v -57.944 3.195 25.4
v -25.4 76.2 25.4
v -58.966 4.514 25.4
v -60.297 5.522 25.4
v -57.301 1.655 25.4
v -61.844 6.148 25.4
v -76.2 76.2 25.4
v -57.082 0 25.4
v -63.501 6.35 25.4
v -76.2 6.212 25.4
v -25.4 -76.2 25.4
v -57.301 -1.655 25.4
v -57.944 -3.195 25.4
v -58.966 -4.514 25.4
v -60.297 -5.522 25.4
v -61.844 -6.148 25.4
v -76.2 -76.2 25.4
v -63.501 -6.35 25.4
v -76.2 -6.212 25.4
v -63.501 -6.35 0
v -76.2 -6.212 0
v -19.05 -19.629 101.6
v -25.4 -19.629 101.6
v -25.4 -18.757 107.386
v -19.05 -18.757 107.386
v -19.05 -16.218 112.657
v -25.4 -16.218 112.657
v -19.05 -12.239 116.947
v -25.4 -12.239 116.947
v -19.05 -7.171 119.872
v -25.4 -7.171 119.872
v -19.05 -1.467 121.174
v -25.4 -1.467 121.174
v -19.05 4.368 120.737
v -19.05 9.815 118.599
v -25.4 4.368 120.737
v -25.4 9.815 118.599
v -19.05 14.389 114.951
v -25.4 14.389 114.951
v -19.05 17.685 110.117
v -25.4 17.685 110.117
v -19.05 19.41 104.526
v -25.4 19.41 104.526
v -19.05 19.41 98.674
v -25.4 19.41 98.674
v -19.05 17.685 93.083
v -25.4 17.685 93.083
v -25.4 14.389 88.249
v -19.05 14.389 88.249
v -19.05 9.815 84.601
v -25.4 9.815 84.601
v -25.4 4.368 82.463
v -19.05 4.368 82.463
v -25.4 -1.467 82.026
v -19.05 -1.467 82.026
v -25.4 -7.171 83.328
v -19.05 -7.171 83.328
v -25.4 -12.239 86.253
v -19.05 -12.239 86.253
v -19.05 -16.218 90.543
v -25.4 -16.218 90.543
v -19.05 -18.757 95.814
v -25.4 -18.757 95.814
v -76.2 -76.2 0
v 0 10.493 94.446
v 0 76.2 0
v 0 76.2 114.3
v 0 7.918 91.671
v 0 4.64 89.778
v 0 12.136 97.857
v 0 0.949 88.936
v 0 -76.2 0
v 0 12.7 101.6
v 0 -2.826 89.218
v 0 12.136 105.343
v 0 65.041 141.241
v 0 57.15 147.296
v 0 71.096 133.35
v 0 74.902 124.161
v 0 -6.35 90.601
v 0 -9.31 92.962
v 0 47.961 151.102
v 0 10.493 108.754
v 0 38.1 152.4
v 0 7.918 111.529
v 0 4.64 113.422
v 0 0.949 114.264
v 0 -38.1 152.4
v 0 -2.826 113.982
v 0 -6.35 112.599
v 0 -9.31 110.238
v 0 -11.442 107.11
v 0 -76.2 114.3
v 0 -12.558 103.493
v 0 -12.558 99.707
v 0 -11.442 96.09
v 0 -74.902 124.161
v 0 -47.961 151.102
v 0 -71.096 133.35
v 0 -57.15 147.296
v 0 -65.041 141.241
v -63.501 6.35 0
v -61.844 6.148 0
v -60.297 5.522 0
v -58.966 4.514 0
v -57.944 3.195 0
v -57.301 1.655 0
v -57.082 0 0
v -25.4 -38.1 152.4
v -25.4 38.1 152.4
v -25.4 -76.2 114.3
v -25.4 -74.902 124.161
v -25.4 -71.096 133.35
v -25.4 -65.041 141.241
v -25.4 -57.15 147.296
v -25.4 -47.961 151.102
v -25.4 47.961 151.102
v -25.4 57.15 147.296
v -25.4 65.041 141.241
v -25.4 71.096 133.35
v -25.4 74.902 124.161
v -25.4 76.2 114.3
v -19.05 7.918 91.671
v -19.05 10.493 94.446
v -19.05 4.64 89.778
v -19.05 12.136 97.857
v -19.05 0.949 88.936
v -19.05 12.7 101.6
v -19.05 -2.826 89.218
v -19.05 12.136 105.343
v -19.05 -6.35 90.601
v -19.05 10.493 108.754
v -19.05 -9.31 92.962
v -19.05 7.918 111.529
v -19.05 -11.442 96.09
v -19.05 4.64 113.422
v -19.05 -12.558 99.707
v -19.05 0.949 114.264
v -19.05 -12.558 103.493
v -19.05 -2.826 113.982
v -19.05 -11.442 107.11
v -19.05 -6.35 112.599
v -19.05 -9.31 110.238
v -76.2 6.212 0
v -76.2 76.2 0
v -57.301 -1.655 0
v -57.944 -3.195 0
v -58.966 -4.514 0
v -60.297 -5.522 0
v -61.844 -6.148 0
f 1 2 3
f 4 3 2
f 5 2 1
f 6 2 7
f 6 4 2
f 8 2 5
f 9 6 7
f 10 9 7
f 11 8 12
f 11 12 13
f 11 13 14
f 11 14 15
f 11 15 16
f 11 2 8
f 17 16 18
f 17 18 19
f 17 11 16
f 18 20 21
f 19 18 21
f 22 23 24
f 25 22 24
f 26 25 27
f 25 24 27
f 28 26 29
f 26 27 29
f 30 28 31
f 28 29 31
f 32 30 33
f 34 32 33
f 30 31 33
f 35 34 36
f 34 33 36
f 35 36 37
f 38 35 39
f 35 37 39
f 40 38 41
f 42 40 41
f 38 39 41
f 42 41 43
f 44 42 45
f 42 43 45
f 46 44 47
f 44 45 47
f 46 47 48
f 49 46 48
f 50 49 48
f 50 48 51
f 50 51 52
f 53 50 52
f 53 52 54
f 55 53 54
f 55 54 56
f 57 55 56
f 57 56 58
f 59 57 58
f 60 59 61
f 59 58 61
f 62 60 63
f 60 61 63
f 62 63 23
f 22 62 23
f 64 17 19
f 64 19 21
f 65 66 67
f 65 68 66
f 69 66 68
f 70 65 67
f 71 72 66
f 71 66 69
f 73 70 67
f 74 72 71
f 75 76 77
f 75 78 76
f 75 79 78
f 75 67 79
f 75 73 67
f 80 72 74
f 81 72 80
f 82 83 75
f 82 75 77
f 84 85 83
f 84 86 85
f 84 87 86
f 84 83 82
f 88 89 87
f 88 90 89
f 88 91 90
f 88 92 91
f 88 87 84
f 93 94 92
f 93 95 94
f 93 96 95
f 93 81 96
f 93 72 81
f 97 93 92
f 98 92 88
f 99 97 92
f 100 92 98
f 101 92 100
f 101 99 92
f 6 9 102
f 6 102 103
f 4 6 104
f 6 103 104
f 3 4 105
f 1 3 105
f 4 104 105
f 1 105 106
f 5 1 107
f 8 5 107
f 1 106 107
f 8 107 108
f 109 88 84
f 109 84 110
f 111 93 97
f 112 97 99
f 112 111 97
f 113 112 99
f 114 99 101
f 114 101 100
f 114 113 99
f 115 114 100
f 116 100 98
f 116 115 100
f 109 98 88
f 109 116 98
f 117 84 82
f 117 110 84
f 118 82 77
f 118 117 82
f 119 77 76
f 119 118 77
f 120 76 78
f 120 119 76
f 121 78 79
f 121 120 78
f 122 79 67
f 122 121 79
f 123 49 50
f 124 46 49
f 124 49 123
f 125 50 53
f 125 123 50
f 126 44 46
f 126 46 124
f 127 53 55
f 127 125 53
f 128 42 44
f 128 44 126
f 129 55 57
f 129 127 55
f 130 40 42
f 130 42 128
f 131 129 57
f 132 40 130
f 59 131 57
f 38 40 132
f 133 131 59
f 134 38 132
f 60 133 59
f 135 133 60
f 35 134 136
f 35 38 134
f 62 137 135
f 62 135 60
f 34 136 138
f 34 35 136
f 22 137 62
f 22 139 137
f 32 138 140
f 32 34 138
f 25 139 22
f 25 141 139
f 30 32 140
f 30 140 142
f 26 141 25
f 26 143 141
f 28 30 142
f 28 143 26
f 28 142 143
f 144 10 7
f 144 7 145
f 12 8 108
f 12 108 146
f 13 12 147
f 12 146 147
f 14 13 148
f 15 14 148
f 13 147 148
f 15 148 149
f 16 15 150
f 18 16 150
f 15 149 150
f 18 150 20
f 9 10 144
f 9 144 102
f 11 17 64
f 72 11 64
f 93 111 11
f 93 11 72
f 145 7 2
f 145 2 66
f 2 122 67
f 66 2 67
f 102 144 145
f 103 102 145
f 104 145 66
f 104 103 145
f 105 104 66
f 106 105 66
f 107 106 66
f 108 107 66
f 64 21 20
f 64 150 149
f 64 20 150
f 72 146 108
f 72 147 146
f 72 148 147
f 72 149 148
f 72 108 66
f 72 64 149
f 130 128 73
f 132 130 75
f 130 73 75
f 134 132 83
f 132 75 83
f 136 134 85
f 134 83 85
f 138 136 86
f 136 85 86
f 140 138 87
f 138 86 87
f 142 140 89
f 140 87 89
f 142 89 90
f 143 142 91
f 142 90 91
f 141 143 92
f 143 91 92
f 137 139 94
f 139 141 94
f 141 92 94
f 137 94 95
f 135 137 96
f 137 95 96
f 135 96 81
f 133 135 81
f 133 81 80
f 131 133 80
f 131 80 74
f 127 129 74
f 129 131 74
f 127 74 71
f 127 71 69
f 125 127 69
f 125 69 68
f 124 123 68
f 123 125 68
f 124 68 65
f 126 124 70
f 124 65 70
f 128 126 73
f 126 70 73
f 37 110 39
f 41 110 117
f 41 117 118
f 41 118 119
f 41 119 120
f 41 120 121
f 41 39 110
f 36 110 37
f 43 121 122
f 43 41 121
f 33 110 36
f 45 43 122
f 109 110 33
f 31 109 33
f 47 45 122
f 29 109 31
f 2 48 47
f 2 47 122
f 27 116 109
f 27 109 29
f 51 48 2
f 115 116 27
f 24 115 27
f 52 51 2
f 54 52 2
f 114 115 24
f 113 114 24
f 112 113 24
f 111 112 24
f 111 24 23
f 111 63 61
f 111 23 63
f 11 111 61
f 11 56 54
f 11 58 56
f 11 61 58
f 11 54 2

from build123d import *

# Parameters (mm, degrees)
F1_DEPTH = 76.2
F2_R     = 12.7
F3_DEPTH = 25.4
F5_DEPTH = 25.4
F6_R     = 38.1
F7_R     = 38.1
F8_R     = 19.629033
F8_R_2   = 12.7
F9_DEPTH = 6.35


with BuildPart() as f1:
    # F0 (on Front) → F1 (new body, symmetric)
    with BuildSketch(Plane.XZ):
        Polygon((-76.2, 0), (0, 0), (0, 152.4), (-25.4, 152.4), (-25.4, 25.4), (-76.2, 25.4), align=None)
    extrude(amount=F1_DEPTH, both=True)

    # F2 (on face) → F3 (cut)
    with BuildSketch(Plane.YZ):
        with Locations((0, 101.6)):
            Circle(F2_R)
    extrude(amount=-F3_DEPTH, mode=Mode.SUBTRACT)

    # F4 (on face) → F5 (cut)
    with BuildSketch(Plane(origin=(0, 0, 0), x_dir=(1, 0, 0), z_dir=(0, 0, -1))):
        with BuildLine():
            ThreePointArc((-63.500749, -6.349625), (-69.781771, 0), (-63.500749, 6.349625))
            Line((-63.500749, 6.349625), (-76.2, 6.211669))
            Line((-76.2, 6.211669), (-76.2, -6.211669))
            Line((-76.2, -6.211669), (-63.500749, -6.349625))
        make_face()
        with BuildLine():
            ThreePointArc((-63.500749, -6.349625), (-58.966097, -4.51445), (-57.081771, 0))
            ThreePointArc((-57.081771, 0), (-58.966097, 4.51445), (-63.500749, 6.349625))
            ThreePointArc((-63.500749, 6.349625), (-69.781771, 0), (-63.500749, -6.349625))
        make_face()
    extrude(amount=-F5_DEPTH, mode=Mode.SUBTRACT)

    # F6
    f6_edges = [f1.edges().sort_by_distance(p)[0] for p in [
        (-12.7, -76.2, 152.4),
    ]]
    fillet(f6_edges, radius=F6_R)

    # F7
    f7_edges = [f1.edges().sort_by_distance(p)[0] for p in [
        (-12.7, 76.2, 152.4),
    ]]
    fillet(f7_edges, radius=F7_R)

    # F8 (on face) → F9 (cut)
    with BuildSketch(Plane(origin=(-25.4, 0, 0), x_dir=(0, -1, 0), z_dir=(-1, 0, 0))):
        with Locations((0, 101.6)):
            Circle(F8_R)
        with Locations((0, 101.6)):
            Circle(F8_R_2, mode=Mode.SUBTRACT)
    extrude(amount=-F9_DEPTH, mode=Mode.SUBTRACT)


solid = f1.part
